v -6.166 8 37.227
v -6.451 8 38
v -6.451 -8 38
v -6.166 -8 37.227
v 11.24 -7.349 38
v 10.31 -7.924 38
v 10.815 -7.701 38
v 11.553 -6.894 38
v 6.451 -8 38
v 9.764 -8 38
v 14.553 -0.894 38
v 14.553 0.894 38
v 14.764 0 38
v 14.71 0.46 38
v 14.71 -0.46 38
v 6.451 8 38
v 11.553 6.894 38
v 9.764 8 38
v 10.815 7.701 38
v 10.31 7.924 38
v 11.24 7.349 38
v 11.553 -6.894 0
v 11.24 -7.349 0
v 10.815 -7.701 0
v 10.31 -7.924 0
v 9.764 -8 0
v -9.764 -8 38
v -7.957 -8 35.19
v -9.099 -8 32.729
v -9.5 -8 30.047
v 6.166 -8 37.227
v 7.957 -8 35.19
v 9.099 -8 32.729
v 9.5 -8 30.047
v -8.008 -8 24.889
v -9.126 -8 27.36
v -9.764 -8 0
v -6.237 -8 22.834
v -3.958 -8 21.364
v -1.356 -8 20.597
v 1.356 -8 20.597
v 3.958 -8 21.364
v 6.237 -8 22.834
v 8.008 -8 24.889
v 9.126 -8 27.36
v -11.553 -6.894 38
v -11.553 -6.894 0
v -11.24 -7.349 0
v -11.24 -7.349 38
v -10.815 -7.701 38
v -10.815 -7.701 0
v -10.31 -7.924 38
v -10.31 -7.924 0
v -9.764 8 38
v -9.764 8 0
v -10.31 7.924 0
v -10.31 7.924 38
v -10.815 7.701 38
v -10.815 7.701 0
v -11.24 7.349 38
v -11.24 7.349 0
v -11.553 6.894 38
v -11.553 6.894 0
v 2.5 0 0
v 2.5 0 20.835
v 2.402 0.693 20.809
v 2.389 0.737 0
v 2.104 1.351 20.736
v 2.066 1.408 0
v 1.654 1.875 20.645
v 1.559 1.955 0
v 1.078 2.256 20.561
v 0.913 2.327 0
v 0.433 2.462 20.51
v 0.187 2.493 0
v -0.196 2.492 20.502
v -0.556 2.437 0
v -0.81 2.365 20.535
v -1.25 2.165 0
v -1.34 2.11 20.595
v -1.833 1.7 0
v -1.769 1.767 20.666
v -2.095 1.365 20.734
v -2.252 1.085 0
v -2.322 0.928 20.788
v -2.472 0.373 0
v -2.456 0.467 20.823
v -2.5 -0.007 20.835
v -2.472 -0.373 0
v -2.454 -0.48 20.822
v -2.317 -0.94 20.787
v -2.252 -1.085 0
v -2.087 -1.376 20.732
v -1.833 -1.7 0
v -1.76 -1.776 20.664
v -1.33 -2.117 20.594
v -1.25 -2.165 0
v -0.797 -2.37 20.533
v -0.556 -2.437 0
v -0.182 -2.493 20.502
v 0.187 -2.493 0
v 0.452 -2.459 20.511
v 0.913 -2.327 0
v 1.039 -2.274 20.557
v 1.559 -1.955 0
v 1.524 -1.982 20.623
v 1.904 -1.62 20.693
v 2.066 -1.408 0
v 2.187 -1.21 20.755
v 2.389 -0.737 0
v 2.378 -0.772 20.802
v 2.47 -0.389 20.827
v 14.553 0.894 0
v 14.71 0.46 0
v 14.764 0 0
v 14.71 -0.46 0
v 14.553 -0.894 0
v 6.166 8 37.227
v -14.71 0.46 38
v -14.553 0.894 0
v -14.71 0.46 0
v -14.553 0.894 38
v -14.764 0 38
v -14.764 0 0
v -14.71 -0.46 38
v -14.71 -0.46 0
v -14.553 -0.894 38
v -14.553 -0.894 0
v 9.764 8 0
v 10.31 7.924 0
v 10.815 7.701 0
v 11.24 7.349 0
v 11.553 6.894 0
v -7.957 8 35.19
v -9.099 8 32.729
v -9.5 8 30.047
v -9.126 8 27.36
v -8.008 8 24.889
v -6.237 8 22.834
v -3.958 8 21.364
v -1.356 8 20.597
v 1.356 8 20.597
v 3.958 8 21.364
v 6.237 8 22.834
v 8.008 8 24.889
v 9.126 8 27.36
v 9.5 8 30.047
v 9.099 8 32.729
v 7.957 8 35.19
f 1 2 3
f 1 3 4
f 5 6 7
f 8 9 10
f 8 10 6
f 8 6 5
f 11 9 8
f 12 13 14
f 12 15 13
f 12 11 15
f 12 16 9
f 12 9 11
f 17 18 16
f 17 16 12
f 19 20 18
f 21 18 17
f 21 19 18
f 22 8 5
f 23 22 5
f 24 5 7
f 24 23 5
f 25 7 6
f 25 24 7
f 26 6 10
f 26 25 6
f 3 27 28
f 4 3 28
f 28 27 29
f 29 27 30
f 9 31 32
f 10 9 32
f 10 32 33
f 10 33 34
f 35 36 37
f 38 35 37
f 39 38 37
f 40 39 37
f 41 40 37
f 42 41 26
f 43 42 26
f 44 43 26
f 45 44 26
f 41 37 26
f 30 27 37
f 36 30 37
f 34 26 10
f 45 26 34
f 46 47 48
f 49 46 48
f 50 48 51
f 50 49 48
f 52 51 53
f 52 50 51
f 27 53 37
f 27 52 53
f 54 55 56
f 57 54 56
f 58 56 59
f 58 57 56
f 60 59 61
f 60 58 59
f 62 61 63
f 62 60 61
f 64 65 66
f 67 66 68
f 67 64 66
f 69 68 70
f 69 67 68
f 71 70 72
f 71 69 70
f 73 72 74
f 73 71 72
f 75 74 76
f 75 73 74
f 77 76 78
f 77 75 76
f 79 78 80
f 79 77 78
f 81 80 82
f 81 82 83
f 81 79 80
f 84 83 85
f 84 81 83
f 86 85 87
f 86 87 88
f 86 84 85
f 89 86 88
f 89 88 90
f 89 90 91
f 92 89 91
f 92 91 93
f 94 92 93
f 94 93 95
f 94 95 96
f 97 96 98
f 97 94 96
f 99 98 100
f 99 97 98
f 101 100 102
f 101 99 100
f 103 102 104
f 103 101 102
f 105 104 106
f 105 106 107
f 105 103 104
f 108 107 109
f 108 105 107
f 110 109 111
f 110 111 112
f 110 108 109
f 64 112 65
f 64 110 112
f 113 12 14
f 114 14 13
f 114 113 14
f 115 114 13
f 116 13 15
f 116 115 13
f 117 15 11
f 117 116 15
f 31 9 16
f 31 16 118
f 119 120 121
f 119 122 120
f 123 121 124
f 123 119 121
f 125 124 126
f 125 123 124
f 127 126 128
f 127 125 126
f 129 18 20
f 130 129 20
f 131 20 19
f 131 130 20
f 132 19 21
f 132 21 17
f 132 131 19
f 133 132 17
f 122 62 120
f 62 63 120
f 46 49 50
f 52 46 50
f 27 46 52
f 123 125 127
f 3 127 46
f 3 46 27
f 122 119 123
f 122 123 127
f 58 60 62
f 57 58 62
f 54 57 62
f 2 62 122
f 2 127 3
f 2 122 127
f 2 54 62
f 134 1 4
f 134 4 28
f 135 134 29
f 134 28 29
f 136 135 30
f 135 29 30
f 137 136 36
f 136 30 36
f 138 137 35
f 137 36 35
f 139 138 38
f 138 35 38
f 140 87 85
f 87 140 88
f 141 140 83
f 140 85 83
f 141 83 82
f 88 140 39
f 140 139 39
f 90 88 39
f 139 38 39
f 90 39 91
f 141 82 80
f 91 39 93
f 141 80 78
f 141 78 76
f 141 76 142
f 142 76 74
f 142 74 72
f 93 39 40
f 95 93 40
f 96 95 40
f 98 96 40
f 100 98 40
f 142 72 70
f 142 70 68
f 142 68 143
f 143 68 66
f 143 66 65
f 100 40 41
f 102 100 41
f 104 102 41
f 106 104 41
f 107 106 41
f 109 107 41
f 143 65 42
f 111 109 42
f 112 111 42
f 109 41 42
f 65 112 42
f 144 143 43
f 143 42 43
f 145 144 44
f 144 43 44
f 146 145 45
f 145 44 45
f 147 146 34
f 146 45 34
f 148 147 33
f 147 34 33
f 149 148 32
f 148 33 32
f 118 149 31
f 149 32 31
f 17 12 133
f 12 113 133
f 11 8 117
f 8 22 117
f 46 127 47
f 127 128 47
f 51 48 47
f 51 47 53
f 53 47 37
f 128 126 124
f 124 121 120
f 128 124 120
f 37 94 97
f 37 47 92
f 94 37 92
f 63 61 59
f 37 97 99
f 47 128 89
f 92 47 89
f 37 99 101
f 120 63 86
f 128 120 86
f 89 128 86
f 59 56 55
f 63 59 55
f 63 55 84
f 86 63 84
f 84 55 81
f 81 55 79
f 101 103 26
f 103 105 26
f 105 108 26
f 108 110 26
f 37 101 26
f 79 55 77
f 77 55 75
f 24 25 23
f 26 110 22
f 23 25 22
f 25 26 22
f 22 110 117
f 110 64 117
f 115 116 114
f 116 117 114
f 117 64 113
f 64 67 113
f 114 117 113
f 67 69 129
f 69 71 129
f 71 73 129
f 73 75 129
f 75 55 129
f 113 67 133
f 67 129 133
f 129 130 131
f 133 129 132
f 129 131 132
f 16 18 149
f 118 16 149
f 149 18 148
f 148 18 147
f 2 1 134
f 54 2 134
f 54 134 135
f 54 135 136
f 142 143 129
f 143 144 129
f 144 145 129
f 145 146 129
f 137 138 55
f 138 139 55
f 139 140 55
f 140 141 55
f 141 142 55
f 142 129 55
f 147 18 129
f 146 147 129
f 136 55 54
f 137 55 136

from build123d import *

# Parameters (mm, degrees)
F0_R        = 2.5
F1_DEPTH    = 20
F2_DEPTH    = 18
F4_DEPTH    = 12.5
F5_R        = 2
F6_T1_DEPTH = 22.7492112937


# Not quite as in the source:
# - a fillet or chamfer that OpenCascade refuses, or shapes differently, is made with other operations: its cross-section is extruded or revolved along the edge and cut away or added


with BuildPart() as f1:
    # F0 (on Top) → F1 (new body)
    with BuildSketch(Plane.XY):
        Polygon((11, 8), (-11, 8), (-15, 0), (-11, -8), (11, -8), (15, 0), align=None)
        Circle(F0_R, mode=Mode.SUBTRACT)
    extrude(amount=F1_DEPTH)

    # F2 (add): a face of the model
    f2_faces = [f1.faces().sort_by_distance(p)[0] for p in [
        (0, 7.66, 20),
    ]]
    extrude(f2_faces, amount=F2_DEPTH)

    # F3 (on Front) → F4 (cut, symmetric)
    with BuildSketch(Plane.XZ):
        with BuildLine():
            Line((5, 38.0777472107), (-5, 38.0777472107))
            ThreePointArc((-5, 38.0777472107), (0, 20.5), (5, 38.0777472107))
        make_face()
    extrude(amount=F4_DEPTH, both=True, mode=Mode.SUBTRACT)

    # F5
    f5_edges = [f1.edges().sort_by_distance(p)[0] for p in [
        (11, -8, 19),
        (15, 0, 19),
        (11, 8, 19),
        (-11, -8, 19),
        (-15, 0, 19),
        (-11, 8, 19),
    ]]
    fillet(f5_edges, radius=F5_R)

    # F6: chamfer of 1.5 on 2 edges, made by hand

    # F6_s2 → F6_t1 (cut)
    with BuildSketch(Plane.XZ.offset(-11.3746056469)):
        with BuildLine():
            Line((-6.4721431849, 38.0562963897), (-6.1455853598, 37.1704776118))
            Line((-6.1455853598, 37.1704776118), (-6.1261127101, 37.1476562202))
            ThreePointArc((-6.1261127101, 37.1476562202), (-5.6470472065, 37.6020890449), (-5.107295987, 37.9747368421))
            Line((-5.107295987, 37.9747368421), (-5.123475383, 38.03))
            ThreePointArc((-5.123475383, 38.03), (-5.7978092839, 38.03), (-6.4721431849, 38.0862963897))
            Line((-6.4721431849, 38.0862963897), (-6.4721431849, 38.0562963897))
        make_face()
        with BuildLine():
            Line((6.4721431849, 38.0562963897), (6.1455853598, 37.1704776118))
            Line((6.1455853598, 37.1704776118), (6.1261127101, 37.1476562202))
            ThreePointArc((6.1261127101, 37.1476562202), (5.6470472065, 37.6020890449), (5.107295987, 37.9747368421))
            Line((5.107295987, 37.9747368421), (5.123475383, 38.03))
            ThreePointArc((5.123475383, 38.03), (5.7978092839, 38.03), (6.4721431849, 38.0862963897))
            Line((6.4721431849, 38.0862963897), (6.4721431849, 38.0562963897))
        make_face()
    extrude(amount=F6_T1_DEPTH, mode=Mode.SUBTRACT)


solid = f1.part
